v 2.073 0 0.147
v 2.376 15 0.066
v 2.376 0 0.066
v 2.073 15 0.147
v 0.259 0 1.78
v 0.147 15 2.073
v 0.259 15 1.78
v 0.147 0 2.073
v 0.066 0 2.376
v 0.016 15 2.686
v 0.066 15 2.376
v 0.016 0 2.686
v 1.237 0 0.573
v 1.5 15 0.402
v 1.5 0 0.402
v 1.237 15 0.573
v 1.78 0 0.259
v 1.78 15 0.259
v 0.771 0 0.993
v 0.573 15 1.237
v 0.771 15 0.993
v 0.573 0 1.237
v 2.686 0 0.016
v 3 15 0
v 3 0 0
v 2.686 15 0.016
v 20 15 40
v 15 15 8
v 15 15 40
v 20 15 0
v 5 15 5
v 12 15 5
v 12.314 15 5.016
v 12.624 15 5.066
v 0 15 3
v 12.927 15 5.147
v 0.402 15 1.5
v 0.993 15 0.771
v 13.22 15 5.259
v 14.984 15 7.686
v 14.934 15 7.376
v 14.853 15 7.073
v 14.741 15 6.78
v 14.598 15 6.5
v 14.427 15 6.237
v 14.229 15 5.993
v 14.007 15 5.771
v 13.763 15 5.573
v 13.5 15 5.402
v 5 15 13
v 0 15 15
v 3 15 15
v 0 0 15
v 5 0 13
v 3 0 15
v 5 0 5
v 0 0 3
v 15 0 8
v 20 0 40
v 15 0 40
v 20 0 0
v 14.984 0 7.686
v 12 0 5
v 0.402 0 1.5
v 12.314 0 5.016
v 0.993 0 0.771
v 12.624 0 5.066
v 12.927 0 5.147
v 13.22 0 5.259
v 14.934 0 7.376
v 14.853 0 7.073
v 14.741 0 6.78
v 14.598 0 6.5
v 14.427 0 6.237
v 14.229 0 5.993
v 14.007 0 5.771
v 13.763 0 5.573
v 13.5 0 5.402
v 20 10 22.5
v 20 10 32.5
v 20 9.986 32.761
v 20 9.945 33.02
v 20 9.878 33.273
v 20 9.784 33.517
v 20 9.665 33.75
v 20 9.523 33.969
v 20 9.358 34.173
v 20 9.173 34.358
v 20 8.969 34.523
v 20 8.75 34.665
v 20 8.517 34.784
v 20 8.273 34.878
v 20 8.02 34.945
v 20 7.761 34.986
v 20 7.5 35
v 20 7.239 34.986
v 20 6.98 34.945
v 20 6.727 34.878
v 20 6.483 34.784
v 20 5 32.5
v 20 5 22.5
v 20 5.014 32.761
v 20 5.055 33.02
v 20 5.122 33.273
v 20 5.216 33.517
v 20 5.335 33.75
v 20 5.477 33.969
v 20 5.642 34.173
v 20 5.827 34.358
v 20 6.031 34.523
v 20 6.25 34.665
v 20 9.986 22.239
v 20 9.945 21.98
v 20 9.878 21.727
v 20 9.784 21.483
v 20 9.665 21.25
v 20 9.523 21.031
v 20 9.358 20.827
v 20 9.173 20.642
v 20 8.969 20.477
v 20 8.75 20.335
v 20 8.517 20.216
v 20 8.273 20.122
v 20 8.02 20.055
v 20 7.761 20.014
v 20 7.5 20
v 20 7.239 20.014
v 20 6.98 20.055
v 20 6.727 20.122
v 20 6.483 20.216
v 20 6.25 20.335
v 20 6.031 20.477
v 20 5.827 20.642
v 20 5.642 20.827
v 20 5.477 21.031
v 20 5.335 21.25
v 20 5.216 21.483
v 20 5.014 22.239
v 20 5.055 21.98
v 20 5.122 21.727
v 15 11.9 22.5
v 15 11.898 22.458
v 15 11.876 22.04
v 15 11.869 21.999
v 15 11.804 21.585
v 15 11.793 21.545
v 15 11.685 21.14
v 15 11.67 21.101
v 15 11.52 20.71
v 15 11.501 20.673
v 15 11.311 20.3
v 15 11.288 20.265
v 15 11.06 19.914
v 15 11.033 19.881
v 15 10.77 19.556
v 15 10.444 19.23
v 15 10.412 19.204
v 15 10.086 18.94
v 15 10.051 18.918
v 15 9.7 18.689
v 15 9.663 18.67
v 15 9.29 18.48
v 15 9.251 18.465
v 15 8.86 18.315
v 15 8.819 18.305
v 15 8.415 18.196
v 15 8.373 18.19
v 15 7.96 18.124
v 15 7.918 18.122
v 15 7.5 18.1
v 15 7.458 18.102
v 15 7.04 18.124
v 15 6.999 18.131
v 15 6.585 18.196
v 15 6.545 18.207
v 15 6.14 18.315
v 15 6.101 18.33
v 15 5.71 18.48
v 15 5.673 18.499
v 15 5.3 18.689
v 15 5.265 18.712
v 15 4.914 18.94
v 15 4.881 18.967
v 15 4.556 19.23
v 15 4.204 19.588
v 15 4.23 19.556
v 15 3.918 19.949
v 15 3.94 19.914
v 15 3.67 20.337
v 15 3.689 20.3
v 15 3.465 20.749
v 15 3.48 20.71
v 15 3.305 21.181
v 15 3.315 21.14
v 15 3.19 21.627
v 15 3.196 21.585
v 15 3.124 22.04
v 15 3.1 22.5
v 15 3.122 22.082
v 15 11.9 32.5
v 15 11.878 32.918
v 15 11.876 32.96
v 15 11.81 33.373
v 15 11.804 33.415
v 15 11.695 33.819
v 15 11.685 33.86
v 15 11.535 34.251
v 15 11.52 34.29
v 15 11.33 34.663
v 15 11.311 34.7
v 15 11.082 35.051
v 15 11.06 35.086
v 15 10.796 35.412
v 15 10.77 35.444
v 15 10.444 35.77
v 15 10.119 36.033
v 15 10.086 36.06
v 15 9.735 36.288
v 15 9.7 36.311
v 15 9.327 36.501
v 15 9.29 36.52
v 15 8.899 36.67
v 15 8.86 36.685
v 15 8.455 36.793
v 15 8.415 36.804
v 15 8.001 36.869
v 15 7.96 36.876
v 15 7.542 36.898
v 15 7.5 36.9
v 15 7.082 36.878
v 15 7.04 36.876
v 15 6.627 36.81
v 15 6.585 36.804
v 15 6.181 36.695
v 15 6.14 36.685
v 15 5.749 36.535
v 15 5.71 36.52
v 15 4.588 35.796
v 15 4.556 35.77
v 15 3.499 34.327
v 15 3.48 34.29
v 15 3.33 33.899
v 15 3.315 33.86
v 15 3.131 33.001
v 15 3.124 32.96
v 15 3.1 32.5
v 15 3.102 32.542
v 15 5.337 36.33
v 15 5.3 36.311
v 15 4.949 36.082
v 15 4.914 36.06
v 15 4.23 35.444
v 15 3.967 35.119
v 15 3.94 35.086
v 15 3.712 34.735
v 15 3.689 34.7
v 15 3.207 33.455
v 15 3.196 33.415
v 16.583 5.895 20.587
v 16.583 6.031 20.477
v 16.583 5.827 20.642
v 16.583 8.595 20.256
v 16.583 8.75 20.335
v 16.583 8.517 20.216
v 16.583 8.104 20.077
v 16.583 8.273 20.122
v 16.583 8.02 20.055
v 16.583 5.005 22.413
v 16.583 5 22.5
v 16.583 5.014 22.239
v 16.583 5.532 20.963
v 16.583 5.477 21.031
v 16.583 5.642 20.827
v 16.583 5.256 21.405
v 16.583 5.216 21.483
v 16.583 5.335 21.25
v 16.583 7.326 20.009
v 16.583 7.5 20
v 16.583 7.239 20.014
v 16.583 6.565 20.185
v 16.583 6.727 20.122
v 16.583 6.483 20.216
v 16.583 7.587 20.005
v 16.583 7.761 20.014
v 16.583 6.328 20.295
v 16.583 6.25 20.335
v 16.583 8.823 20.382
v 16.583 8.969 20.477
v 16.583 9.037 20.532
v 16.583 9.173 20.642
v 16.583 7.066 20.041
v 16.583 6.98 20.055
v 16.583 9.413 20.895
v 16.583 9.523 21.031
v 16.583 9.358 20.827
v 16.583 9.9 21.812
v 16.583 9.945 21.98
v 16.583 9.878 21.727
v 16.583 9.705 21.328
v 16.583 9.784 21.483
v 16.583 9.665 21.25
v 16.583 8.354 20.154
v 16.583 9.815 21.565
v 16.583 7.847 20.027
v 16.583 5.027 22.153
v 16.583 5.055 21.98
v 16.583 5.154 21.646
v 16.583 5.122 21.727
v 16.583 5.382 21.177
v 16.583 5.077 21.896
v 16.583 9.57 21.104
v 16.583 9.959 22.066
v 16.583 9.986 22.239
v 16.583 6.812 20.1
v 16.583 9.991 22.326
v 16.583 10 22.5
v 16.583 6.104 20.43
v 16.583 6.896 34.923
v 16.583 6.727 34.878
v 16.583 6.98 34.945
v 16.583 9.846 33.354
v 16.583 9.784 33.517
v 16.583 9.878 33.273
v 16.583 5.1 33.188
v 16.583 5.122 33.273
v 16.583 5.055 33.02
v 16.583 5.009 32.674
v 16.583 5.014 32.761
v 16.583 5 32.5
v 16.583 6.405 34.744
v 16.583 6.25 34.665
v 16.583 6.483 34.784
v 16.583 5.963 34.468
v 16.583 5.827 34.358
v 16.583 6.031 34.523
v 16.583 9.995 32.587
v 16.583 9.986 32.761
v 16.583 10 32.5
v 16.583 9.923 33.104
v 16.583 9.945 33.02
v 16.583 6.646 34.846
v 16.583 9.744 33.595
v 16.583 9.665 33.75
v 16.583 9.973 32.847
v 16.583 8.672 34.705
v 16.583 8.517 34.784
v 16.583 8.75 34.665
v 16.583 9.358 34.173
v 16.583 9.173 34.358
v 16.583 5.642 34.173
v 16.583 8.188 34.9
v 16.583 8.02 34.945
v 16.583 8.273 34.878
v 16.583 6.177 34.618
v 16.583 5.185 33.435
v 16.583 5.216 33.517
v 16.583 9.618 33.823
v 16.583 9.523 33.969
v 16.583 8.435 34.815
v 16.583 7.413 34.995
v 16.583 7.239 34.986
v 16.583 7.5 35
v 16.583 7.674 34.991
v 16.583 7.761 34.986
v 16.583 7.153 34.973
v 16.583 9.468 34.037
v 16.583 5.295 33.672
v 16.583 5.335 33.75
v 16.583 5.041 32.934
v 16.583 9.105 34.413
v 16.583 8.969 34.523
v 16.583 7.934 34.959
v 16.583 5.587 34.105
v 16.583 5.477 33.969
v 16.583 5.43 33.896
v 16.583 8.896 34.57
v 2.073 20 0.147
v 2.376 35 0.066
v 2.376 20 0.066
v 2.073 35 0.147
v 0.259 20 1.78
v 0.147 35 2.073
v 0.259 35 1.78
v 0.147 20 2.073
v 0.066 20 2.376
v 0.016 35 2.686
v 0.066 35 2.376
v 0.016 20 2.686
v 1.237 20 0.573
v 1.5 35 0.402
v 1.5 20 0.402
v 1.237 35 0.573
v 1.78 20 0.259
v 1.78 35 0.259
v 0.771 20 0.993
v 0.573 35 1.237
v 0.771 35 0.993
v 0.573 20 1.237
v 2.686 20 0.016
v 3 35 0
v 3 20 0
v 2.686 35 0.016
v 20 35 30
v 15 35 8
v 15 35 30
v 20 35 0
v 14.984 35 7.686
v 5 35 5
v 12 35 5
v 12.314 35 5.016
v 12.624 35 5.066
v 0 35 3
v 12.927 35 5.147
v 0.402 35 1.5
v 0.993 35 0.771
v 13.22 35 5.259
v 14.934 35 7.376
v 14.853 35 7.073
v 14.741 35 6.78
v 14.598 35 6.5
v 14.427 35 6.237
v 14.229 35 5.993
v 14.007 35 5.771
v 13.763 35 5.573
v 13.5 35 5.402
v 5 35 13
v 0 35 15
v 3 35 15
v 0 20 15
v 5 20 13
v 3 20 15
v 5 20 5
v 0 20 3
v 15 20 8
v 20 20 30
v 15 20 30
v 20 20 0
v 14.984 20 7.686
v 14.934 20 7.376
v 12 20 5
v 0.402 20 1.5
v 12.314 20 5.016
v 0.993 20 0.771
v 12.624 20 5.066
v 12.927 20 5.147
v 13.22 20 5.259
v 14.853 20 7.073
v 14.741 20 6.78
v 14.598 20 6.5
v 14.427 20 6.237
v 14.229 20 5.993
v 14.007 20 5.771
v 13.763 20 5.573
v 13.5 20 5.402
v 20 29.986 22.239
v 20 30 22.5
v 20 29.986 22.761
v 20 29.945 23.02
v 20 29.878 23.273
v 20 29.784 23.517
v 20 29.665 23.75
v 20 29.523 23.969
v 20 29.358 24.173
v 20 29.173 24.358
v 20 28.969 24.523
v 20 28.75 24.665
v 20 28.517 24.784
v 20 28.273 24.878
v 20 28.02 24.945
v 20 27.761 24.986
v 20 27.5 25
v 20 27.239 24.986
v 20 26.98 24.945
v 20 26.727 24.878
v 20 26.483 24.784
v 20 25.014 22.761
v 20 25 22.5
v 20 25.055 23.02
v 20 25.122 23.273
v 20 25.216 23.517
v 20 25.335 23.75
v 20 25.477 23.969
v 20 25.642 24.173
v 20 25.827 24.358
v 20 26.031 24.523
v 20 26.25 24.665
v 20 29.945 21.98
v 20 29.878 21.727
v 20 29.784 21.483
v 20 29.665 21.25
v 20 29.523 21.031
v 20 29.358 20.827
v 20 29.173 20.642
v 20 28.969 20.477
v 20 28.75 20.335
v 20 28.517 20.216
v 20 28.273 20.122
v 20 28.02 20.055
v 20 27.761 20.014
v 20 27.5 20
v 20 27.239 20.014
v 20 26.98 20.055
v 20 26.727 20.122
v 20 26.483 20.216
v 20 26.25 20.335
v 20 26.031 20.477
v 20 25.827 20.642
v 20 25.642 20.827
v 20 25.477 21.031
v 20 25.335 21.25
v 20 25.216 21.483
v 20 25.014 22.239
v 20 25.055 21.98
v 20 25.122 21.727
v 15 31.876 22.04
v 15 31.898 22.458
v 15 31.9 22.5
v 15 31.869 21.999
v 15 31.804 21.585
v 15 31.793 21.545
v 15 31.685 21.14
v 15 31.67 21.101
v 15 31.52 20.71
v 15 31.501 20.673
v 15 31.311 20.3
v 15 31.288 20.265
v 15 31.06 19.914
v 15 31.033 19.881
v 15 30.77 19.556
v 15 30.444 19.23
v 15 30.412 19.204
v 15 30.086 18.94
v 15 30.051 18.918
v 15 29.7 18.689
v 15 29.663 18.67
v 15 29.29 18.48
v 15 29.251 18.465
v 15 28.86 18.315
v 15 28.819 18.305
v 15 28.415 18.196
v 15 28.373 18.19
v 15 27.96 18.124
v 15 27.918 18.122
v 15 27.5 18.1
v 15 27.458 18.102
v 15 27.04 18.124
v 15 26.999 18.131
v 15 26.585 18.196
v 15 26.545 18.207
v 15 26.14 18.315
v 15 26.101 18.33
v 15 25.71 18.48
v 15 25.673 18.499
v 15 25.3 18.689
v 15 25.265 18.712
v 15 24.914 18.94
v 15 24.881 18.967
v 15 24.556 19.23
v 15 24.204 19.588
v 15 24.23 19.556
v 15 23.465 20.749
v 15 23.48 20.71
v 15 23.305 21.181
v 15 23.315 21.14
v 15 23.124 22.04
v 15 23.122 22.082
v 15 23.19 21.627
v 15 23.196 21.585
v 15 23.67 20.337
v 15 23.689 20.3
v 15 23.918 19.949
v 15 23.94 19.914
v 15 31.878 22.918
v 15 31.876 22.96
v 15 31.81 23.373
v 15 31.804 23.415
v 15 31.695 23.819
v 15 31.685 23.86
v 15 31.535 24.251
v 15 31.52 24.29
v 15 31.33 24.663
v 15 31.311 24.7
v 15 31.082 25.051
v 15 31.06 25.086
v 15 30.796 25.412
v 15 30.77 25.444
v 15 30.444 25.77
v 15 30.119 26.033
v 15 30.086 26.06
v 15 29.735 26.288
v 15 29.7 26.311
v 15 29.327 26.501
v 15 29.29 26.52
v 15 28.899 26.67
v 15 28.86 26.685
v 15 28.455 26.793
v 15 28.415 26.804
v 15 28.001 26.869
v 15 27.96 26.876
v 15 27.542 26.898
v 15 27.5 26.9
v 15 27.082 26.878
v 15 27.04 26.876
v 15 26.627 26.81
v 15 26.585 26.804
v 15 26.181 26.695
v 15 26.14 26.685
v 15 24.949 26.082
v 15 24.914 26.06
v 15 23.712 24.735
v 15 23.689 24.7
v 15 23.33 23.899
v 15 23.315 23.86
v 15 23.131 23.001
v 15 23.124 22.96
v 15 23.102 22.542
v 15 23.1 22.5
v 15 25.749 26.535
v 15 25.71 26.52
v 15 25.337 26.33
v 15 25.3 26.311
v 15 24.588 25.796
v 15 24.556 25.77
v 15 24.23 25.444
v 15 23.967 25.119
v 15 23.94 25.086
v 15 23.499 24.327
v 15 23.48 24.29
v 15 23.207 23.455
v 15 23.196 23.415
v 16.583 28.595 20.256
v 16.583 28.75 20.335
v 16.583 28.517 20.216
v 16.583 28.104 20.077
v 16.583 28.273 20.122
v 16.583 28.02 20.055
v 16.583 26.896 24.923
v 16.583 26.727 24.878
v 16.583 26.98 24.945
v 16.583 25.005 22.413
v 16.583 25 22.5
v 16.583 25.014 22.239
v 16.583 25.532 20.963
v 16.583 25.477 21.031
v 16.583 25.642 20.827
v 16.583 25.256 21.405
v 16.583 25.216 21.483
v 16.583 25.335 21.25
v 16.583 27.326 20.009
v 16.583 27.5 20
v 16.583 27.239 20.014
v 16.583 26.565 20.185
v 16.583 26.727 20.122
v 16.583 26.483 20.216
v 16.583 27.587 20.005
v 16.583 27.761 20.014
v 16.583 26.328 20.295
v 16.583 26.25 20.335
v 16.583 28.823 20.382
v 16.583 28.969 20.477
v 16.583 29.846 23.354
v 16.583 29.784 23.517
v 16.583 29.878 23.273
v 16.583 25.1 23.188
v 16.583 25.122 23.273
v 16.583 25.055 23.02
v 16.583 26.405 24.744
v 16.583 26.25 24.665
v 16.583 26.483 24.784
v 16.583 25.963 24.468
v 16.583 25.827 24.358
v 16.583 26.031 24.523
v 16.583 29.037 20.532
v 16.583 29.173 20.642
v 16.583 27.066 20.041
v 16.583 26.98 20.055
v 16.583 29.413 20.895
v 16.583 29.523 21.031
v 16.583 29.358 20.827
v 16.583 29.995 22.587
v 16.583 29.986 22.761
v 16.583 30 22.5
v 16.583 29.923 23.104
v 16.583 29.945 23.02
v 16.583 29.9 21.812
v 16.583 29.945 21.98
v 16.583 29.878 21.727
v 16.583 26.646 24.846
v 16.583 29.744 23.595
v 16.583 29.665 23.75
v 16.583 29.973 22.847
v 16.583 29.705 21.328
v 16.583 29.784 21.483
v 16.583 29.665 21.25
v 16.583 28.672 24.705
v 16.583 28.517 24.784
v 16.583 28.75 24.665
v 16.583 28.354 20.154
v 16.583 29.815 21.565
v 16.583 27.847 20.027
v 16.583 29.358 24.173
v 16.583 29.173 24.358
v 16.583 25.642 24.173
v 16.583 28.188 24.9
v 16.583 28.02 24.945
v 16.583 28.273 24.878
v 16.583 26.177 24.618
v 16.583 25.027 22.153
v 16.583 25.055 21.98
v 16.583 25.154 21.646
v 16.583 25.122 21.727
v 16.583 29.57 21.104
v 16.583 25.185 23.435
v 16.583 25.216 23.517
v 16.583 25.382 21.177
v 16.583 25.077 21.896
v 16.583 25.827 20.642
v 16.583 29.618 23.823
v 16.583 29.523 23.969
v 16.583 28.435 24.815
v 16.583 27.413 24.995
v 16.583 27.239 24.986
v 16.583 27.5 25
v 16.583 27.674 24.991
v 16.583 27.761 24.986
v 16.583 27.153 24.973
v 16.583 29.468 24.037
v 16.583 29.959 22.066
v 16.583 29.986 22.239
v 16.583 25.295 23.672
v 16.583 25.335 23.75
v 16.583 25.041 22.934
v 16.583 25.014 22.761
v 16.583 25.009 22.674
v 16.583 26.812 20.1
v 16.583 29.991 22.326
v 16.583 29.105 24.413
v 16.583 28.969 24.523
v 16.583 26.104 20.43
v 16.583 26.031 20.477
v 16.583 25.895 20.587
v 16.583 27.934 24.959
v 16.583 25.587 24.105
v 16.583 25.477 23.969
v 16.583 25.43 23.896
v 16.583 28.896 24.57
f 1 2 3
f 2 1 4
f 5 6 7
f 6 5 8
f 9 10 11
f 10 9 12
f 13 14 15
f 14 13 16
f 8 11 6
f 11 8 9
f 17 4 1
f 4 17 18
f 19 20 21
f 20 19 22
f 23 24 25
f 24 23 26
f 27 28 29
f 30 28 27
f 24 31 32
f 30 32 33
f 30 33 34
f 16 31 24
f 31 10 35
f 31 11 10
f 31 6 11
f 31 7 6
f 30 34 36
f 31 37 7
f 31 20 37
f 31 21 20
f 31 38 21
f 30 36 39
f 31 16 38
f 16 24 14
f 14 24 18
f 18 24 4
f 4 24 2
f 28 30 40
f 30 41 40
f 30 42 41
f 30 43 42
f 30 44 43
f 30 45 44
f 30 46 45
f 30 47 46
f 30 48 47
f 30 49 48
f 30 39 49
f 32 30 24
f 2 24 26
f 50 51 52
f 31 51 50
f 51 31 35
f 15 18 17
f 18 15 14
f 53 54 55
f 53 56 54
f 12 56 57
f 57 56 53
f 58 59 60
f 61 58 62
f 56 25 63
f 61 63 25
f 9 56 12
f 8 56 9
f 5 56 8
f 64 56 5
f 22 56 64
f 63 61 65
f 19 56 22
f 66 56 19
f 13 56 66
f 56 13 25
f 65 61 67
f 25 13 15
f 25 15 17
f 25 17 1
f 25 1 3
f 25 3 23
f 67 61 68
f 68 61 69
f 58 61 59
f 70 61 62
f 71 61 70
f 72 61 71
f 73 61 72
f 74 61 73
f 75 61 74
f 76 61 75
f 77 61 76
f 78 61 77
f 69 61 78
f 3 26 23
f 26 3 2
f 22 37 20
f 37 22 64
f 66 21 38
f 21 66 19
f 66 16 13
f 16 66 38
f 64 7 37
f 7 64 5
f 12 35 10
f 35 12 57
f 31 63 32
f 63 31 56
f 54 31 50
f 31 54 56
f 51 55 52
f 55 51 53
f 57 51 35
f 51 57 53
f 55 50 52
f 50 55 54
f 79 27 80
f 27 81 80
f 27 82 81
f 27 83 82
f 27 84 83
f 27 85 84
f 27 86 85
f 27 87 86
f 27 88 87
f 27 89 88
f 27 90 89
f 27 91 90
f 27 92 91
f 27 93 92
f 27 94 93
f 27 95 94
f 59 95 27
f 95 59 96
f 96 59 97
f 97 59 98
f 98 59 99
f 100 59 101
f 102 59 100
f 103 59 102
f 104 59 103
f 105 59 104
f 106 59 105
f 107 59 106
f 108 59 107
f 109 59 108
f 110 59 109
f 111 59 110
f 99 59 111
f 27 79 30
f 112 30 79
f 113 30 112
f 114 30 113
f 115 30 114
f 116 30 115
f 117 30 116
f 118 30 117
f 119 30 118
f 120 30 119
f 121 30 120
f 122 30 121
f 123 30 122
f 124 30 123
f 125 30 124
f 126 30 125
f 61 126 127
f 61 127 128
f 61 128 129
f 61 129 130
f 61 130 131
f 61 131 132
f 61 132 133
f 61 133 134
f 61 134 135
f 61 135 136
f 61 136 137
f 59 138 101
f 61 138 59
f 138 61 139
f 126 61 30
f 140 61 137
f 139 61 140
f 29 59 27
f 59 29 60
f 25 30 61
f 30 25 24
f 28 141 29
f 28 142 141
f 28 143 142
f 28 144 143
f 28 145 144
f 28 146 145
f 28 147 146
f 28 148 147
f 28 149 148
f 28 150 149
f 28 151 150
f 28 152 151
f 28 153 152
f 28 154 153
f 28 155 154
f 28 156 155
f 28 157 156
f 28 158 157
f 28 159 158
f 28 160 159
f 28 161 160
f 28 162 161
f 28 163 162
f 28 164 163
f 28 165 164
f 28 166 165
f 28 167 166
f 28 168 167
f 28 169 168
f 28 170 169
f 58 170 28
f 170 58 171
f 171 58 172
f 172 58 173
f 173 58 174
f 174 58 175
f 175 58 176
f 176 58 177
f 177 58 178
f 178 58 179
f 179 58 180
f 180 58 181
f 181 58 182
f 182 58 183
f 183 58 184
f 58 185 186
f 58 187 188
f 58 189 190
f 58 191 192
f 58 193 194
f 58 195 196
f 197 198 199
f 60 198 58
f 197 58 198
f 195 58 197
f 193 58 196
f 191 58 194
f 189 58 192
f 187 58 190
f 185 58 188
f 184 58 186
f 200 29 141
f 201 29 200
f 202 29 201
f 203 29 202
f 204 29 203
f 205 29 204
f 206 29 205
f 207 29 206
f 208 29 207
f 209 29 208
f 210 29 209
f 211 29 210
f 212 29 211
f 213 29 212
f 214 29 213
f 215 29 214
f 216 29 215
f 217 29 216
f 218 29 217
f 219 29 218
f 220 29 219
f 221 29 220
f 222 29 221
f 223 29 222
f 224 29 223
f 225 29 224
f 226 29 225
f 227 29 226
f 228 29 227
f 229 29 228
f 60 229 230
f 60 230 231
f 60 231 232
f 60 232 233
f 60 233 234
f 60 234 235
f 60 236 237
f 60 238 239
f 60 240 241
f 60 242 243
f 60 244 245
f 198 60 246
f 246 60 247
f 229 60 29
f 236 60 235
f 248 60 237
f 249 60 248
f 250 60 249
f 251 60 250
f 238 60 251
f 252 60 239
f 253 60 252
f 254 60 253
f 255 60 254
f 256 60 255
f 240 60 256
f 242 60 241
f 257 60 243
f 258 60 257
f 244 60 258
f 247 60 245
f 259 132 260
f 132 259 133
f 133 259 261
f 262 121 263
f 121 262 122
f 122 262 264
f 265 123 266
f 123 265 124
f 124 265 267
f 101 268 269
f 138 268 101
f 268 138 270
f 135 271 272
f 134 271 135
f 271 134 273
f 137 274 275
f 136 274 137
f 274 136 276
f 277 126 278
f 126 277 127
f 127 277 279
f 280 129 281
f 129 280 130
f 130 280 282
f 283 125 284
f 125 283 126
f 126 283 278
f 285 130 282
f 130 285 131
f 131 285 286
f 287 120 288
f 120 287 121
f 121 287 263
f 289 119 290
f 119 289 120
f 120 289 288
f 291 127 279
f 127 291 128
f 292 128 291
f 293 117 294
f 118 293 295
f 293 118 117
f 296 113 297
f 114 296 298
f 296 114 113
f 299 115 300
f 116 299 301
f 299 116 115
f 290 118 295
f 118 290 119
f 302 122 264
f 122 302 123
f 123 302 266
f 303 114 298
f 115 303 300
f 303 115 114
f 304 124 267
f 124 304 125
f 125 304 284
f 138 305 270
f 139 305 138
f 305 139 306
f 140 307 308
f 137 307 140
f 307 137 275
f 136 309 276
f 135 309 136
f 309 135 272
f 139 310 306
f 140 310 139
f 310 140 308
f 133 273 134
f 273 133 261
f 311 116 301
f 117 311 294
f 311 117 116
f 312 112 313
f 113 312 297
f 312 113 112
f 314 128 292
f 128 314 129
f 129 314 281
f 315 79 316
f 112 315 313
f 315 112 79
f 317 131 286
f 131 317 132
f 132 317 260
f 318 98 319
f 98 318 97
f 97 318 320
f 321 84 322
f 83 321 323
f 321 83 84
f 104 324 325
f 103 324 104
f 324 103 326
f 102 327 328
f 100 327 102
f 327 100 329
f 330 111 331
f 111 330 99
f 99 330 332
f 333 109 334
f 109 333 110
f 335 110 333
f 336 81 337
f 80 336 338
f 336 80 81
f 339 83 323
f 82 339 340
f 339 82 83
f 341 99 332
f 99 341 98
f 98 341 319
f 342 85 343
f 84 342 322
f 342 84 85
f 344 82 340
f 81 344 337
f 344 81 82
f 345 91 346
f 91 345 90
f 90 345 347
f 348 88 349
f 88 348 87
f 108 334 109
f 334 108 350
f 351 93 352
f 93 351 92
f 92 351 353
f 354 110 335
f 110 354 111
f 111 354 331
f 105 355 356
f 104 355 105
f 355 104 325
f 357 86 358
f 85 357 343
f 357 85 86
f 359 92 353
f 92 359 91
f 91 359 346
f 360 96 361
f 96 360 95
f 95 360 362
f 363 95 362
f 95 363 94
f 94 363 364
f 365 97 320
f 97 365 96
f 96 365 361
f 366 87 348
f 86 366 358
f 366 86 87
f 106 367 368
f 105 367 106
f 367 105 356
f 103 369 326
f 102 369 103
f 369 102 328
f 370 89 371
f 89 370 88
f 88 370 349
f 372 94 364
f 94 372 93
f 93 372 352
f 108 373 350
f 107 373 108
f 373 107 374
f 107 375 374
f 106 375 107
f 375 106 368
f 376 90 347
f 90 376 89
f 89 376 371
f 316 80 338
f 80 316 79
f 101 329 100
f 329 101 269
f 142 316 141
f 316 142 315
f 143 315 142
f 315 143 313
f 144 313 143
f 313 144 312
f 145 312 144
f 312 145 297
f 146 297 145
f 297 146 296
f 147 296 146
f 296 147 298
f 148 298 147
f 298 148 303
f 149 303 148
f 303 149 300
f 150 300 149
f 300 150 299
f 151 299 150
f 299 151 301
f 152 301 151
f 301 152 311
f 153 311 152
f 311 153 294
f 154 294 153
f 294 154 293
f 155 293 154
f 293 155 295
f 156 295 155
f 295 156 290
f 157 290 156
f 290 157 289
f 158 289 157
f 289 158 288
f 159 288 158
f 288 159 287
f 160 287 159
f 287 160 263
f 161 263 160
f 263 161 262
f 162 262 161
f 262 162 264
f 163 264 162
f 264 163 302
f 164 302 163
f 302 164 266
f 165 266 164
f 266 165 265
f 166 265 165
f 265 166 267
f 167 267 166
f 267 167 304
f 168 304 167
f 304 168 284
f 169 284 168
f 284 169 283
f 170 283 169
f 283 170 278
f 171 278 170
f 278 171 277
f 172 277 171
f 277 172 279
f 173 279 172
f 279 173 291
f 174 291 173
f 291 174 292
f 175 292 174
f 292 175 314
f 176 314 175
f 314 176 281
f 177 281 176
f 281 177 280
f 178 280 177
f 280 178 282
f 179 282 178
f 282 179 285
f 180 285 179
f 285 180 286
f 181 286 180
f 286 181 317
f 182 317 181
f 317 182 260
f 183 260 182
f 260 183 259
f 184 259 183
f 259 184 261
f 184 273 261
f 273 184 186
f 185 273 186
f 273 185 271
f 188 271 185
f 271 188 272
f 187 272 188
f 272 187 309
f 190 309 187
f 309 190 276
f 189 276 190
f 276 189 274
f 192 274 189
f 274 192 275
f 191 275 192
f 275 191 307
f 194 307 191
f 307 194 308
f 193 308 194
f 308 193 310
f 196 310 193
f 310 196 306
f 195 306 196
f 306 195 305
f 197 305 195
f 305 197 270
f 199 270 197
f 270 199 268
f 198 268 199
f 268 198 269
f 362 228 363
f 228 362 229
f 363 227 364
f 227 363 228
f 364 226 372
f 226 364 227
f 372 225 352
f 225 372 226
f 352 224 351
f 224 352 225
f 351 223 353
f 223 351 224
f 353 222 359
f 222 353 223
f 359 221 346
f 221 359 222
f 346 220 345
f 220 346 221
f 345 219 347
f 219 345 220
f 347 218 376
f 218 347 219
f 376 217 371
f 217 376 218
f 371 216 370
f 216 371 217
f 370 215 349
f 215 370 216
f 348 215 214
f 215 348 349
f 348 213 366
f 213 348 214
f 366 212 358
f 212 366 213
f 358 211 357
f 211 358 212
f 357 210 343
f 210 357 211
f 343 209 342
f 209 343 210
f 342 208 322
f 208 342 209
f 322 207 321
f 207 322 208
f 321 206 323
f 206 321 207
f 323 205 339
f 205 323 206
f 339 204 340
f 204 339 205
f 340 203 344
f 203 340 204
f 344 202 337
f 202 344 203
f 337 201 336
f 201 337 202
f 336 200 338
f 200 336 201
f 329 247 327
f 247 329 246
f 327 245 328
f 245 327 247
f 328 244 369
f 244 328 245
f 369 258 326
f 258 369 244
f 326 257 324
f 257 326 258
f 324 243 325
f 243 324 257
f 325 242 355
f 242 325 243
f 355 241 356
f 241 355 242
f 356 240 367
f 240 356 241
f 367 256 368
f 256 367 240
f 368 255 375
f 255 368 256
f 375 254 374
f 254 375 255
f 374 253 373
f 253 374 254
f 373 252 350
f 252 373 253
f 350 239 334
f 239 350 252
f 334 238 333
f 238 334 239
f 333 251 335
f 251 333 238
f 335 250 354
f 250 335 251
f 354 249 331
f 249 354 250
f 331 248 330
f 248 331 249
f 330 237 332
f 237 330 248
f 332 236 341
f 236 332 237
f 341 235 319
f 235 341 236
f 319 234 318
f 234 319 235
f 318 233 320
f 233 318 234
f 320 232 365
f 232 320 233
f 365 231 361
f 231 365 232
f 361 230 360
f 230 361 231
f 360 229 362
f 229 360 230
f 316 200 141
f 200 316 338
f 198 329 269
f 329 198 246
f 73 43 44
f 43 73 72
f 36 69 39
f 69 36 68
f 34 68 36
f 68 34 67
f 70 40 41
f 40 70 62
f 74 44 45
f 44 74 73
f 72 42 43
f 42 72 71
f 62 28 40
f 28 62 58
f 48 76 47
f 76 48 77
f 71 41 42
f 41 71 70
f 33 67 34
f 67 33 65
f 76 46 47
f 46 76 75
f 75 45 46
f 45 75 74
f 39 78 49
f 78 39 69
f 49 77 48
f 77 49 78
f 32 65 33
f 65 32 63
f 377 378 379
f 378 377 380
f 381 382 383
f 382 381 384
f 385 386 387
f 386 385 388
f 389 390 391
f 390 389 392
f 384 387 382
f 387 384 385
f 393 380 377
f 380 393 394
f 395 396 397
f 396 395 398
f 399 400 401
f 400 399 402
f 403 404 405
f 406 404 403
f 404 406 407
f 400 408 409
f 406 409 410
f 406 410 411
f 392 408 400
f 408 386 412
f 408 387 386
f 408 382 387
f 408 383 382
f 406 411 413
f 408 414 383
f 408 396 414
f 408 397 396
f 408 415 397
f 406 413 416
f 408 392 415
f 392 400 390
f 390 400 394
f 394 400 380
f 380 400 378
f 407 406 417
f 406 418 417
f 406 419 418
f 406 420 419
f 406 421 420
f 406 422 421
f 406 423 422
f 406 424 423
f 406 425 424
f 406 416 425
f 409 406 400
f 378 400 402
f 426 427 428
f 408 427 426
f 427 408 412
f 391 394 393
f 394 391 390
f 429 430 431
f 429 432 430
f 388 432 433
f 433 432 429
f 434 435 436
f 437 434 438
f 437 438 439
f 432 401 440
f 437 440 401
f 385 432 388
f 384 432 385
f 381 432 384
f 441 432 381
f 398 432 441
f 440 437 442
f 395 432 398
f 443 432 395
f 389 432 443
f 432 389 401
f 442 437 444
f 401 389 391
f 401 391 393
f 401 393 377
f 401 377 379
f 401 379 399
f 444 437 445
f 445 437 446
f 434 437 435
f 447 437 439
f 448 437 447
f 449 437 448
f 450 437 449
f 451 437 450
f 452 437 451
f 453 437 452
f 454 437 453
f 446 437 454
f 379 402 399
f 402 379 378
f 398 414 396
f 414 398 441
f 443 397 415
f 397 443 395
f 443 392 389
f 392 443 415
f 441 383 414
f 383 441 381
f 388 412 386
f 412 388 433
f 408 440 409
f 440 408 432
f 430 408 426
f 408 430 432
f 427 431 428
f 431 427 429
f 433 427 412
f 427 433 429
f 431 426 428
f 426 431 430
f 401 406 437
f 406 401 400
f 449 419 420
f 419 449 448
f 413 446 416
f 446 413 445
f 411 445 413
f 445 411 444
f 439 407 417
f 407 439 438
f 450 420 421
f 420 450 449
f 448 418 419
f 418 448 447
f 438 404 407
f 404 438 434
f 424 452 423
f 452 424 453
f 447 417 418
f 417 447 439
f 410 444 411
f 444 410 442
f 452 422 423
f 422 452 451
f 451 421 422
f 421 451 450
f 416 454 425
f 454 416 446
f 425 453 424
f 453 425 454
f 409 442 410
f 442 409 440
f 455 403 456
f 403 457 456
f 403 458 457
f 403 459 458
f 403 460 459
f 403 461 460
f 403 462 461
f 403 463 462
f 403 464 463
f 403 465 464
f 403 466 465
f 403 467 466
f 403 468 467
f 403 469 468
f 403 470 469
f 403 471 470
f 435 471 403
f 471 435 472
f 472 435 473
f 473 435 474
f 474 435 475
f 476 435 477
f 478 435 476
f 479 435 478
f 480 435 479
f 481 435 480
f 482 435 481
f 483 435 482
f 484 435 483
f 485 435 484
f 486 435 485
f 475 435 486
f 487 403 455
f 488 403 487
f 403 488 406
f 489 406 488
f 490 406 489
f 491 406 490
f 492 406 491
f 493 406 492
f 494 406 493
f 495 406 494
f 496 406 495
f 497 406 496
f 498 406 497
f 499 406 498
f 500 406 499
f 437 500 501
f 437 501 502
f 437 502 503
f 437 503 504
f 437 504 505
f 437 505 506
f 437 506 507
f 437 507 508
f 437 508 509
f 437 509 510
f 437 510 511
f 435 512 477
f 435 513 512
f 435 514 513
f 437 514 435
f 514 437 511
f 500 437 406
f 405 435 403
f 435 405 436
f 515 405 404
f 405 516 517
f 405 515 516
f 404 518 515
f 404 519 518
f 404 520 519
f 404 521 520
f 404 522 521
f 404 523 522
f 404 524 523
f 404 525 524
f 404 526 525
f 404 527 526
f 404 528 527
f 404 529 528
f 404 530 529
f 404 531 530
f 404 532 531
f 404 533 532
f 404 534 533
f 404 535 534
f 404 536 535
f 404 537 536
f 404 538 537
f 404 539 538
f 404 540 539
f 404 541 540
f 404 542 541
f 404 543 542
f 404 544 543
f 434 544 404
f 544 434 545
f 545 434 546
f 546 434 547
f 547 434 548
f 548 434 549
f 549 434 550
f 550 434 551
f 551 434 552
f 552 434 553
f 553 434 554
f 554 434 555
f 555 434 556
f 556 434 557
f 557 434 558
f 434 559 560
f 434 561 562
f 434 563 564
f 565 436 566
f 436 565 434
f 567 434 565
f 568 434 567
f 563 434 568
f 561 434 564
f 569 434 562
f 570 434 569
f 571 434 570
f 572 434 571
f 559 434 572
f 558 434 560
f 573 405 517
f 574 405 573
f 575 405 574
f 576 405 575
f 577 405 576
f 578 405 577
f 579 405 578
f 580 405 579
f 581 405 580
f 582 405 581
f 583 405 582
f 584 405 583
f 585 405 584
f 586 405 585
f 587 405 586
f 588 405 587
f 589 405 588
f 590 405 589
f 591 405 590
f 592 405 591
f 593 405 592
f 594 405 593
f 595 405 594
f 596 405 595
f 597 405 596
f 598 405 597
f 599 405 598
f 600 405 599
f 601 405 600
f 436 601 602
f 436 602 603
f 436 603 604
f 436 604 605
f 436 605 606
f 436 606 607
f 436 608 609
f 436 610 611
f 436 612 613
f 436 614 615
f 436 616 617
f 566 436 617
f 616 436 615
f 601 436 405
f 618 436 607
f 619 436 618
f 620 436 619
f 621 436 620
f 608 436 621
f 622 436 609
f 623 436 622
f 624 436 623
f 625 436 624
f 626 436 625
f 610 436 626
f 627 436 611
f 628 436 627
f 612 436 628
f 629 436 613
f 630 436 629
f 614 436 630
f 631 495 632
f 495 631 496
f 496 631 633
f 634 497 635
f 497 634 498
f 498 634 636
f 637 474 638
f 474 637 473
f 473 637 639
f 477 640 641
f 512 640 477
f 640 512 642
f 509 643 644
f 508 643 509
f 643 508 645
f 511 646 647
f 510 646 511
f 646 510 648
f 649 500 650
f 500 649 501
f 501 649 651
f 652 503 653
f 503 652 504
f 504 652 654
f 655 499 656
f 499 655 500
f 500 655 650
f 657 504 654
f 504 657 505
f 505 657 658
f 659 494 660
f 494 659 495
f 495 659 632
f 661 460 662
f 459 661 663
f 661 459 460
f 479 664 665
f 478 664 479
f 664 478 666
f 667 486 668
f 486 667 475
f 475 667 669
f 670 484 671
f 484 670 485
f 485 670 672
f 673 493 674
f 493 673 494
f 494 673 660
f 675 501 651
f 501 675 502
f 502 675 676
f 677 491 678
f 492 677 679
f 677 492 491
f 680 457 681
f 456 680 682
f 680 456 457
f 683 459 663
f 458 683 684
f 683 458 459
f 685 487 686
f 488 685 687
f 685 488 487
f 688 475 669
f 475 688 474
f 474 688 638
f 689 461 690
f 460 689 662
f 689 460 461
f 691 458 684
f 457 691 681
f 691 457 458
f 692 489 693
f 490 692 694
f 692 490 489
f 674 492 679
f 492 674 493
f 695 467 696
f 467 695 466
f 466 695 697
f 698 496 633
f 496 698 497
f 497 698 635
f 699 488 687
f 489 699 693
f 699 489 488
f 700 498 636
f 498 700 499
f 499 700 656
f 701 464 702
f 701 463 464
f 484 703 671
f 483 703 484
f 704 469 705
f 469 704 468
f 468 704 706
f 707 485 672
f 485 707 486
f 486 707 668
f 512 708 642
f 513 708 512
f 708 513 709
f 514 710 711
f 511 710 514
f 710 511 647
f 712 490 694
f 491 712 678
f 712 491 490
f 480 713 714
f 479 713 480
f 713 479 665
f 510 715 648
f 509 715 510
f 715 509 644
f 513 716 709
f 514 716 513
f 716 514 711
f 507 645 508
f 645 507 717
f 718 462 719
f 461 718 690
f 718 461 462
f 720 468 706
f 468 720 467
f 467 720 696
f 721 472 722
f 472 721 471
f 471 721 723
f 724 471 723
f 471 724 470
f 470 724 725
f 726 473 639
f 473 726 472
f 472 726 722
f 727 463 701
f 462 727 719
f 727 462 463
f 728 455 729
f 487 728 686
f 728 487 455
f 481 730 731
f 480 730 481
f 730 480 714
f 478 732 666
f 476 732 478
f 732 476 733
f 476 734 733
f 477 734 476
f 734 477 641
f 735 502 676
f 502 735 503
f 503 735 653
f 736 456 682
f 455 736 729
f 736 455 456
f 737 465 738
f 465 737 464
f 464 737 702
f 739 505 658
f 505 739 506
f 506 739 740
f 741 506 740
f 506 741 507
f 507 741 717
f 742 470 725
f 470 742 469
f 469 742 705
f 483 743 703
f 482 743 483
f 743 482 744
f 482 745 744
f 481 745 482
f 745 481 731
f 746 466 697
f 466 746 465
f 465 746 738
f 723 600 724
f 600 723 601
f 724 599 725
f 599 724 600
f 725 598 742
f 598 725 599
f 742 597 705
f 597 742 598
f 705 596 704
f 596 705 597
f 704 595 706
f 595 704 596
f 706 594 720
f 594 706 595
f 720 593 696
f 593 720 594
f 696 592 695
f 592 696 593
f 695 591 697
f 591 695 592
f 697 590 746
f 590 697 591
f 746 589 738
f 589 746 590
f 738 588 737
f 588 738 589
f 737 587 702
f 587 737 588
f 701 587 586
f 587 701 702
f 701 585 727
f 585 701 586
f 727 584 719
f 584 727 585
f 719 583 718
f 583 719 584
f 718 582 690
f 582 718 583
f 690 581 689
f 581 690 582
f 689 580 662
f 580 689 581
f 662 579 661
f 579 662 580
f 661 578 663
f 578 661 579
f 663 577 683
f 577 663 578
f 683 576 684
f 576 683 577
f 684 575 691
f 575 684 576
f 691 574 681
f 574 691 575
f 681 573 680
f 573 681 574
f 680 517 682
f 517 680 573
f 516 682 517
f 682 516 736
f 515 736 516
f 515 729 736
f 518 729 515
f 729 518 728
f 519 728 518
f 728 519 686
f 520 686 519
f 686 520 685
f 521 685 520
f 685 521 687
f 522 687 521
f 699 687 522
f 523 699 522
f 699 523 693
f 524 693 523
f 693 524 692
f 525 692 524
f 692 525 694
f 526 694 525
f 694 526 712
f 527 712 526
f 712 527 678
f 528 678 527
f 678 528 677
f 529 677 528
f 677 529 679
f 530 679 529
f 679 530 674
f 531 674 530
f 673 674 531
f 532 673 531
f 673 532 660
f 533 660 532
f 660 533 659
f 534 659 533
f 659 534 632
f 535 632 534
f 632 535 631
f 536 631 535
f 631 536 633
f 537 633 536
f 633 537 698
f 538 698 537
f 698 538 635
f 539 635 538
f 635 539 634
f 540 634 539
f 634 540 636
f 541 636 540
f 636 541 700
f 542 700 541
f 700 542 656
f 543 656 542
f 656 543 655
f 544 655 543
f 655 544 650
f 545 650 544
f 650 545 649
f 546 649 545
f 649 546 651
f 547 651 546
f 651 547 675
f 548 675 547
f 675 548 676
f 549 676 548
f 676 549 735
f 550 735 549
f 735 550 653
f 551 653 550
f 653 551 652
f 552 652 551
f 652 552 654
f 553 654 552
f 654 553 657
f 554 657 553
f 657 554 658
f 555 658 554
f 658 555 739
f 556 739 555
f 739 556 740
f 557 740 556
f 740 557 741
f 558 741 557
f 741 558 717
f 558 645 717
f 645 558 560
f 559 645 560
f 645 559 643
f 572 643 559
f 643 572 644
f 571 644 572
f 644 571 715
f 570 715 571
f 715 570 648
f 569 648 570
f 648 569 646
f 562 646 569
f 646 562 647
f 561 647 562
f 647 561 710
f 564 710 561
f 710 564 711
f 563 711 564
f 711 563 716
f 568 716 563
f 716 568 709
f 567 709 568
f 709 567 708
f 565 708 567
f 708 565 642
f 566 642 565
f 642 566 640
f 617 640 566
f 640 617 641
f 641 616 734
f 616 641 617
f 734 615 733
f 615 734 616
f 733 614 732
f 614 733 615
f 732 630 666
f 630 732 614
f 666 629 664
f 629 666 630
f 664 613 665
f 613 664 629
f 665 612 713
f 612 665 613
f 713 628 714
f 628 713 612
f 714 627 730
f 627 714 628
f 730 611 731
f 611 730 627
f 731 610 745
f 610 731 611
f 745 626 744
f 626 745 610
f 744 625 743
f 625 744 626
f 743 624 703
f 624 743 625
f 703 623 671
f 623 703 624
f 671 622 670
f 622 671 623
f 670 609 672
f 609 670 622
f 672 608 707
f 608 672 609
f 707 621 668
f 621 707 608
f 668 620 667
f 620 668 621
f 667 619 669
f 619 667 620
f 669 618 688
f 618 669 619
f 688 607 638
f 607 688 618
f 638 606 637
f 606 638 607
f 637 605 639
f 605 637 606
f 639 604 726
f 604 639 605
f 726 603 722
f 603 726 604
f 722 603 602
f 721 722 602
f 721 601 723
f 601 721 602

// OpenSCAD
$fn = 60;

width = 15;

hook(true);

translate([0, width + 5, 0]) {
    hook(false);
}

module hook(long = false) {
    difference() {
        translate([3, width, 3])
            rotate([90, 0, 0])
                cylinder(width, 3, 3);
        translate([5, -0.5, 5])
            cube([2, width + 1, 2]);
    }
    translate([3, 0, 0])
        cube([17, width, 5]);
    difference() {
        translate([0, 0, 3])
            cube([5, width, 12]);
        translate([2.5, width + 0.5, 15.5])
            rotate([90, 0, 0])
                linear_extrude(width + 1)
                    polygon([[0, 0], [3, -3], [3, 0]]);
    }
    if (long) {
        difference() {
            translate([15, 0, 0])
                cube([5, width, 40]);
            translate([14.5, width / 2, 22.5])
                rotate([0, 90, 0])
                cylinder(6, 2.5, 2.5);
            translate([14.5, width / 2, 32.5])
                rotate([0, 90, 0])
                cylinder(6, 2.5, 2.5);
            translate([14.5, width /2 - 2.5, 22.5])
                cube([6, 5, 10]);
            translate([15, width / 2, 22.5])
                rotate([0, 90, 0])
                    rotate_extrude()
                        polygon([[5, -0.5],[2, -0.5],[2, 2]]);
            translate([15, width / 2, 32.5])
                rotate([0, 90, 0])
                    rotate_extrude()
                        polygon([[5, -0.5],[2, -0.5],[2, 2]]);
            translate([14.5, width / 2, 22.5])
                linear_extrude(10)
                    polygon([[2.5, 2], [0, 0], [0, 5]]);
            translate([14.5, width / 2, 22.5])
                linear_extrude(10)
                    polygon([[2.5, -2], [0, 0], [0, -5]]);
        }
    } else {
        difference() {
            translate([15, 0, 0])
                cube([5, width, 30]);
            translate([14.5, width / 2, 22.5])
                rotate([0, 90, 0])
                cylinder(6, 2.5, 2.5);
            translate([15, width / 2, 22.5])
                rotate([0, 90, 0])
                    rotate_extrude()
                        polygon([[5, -0.5],[2, -0.5],[2, 2]]);
            
        }
    }
    difference() {
        translate([12, 0, 0])
            cube([4, width, 8]);
        translate([12, width + 0.5, 8])
            rotate([90, 0, 0])
                cylinder(width + 1, 3, 3);
    }
}
